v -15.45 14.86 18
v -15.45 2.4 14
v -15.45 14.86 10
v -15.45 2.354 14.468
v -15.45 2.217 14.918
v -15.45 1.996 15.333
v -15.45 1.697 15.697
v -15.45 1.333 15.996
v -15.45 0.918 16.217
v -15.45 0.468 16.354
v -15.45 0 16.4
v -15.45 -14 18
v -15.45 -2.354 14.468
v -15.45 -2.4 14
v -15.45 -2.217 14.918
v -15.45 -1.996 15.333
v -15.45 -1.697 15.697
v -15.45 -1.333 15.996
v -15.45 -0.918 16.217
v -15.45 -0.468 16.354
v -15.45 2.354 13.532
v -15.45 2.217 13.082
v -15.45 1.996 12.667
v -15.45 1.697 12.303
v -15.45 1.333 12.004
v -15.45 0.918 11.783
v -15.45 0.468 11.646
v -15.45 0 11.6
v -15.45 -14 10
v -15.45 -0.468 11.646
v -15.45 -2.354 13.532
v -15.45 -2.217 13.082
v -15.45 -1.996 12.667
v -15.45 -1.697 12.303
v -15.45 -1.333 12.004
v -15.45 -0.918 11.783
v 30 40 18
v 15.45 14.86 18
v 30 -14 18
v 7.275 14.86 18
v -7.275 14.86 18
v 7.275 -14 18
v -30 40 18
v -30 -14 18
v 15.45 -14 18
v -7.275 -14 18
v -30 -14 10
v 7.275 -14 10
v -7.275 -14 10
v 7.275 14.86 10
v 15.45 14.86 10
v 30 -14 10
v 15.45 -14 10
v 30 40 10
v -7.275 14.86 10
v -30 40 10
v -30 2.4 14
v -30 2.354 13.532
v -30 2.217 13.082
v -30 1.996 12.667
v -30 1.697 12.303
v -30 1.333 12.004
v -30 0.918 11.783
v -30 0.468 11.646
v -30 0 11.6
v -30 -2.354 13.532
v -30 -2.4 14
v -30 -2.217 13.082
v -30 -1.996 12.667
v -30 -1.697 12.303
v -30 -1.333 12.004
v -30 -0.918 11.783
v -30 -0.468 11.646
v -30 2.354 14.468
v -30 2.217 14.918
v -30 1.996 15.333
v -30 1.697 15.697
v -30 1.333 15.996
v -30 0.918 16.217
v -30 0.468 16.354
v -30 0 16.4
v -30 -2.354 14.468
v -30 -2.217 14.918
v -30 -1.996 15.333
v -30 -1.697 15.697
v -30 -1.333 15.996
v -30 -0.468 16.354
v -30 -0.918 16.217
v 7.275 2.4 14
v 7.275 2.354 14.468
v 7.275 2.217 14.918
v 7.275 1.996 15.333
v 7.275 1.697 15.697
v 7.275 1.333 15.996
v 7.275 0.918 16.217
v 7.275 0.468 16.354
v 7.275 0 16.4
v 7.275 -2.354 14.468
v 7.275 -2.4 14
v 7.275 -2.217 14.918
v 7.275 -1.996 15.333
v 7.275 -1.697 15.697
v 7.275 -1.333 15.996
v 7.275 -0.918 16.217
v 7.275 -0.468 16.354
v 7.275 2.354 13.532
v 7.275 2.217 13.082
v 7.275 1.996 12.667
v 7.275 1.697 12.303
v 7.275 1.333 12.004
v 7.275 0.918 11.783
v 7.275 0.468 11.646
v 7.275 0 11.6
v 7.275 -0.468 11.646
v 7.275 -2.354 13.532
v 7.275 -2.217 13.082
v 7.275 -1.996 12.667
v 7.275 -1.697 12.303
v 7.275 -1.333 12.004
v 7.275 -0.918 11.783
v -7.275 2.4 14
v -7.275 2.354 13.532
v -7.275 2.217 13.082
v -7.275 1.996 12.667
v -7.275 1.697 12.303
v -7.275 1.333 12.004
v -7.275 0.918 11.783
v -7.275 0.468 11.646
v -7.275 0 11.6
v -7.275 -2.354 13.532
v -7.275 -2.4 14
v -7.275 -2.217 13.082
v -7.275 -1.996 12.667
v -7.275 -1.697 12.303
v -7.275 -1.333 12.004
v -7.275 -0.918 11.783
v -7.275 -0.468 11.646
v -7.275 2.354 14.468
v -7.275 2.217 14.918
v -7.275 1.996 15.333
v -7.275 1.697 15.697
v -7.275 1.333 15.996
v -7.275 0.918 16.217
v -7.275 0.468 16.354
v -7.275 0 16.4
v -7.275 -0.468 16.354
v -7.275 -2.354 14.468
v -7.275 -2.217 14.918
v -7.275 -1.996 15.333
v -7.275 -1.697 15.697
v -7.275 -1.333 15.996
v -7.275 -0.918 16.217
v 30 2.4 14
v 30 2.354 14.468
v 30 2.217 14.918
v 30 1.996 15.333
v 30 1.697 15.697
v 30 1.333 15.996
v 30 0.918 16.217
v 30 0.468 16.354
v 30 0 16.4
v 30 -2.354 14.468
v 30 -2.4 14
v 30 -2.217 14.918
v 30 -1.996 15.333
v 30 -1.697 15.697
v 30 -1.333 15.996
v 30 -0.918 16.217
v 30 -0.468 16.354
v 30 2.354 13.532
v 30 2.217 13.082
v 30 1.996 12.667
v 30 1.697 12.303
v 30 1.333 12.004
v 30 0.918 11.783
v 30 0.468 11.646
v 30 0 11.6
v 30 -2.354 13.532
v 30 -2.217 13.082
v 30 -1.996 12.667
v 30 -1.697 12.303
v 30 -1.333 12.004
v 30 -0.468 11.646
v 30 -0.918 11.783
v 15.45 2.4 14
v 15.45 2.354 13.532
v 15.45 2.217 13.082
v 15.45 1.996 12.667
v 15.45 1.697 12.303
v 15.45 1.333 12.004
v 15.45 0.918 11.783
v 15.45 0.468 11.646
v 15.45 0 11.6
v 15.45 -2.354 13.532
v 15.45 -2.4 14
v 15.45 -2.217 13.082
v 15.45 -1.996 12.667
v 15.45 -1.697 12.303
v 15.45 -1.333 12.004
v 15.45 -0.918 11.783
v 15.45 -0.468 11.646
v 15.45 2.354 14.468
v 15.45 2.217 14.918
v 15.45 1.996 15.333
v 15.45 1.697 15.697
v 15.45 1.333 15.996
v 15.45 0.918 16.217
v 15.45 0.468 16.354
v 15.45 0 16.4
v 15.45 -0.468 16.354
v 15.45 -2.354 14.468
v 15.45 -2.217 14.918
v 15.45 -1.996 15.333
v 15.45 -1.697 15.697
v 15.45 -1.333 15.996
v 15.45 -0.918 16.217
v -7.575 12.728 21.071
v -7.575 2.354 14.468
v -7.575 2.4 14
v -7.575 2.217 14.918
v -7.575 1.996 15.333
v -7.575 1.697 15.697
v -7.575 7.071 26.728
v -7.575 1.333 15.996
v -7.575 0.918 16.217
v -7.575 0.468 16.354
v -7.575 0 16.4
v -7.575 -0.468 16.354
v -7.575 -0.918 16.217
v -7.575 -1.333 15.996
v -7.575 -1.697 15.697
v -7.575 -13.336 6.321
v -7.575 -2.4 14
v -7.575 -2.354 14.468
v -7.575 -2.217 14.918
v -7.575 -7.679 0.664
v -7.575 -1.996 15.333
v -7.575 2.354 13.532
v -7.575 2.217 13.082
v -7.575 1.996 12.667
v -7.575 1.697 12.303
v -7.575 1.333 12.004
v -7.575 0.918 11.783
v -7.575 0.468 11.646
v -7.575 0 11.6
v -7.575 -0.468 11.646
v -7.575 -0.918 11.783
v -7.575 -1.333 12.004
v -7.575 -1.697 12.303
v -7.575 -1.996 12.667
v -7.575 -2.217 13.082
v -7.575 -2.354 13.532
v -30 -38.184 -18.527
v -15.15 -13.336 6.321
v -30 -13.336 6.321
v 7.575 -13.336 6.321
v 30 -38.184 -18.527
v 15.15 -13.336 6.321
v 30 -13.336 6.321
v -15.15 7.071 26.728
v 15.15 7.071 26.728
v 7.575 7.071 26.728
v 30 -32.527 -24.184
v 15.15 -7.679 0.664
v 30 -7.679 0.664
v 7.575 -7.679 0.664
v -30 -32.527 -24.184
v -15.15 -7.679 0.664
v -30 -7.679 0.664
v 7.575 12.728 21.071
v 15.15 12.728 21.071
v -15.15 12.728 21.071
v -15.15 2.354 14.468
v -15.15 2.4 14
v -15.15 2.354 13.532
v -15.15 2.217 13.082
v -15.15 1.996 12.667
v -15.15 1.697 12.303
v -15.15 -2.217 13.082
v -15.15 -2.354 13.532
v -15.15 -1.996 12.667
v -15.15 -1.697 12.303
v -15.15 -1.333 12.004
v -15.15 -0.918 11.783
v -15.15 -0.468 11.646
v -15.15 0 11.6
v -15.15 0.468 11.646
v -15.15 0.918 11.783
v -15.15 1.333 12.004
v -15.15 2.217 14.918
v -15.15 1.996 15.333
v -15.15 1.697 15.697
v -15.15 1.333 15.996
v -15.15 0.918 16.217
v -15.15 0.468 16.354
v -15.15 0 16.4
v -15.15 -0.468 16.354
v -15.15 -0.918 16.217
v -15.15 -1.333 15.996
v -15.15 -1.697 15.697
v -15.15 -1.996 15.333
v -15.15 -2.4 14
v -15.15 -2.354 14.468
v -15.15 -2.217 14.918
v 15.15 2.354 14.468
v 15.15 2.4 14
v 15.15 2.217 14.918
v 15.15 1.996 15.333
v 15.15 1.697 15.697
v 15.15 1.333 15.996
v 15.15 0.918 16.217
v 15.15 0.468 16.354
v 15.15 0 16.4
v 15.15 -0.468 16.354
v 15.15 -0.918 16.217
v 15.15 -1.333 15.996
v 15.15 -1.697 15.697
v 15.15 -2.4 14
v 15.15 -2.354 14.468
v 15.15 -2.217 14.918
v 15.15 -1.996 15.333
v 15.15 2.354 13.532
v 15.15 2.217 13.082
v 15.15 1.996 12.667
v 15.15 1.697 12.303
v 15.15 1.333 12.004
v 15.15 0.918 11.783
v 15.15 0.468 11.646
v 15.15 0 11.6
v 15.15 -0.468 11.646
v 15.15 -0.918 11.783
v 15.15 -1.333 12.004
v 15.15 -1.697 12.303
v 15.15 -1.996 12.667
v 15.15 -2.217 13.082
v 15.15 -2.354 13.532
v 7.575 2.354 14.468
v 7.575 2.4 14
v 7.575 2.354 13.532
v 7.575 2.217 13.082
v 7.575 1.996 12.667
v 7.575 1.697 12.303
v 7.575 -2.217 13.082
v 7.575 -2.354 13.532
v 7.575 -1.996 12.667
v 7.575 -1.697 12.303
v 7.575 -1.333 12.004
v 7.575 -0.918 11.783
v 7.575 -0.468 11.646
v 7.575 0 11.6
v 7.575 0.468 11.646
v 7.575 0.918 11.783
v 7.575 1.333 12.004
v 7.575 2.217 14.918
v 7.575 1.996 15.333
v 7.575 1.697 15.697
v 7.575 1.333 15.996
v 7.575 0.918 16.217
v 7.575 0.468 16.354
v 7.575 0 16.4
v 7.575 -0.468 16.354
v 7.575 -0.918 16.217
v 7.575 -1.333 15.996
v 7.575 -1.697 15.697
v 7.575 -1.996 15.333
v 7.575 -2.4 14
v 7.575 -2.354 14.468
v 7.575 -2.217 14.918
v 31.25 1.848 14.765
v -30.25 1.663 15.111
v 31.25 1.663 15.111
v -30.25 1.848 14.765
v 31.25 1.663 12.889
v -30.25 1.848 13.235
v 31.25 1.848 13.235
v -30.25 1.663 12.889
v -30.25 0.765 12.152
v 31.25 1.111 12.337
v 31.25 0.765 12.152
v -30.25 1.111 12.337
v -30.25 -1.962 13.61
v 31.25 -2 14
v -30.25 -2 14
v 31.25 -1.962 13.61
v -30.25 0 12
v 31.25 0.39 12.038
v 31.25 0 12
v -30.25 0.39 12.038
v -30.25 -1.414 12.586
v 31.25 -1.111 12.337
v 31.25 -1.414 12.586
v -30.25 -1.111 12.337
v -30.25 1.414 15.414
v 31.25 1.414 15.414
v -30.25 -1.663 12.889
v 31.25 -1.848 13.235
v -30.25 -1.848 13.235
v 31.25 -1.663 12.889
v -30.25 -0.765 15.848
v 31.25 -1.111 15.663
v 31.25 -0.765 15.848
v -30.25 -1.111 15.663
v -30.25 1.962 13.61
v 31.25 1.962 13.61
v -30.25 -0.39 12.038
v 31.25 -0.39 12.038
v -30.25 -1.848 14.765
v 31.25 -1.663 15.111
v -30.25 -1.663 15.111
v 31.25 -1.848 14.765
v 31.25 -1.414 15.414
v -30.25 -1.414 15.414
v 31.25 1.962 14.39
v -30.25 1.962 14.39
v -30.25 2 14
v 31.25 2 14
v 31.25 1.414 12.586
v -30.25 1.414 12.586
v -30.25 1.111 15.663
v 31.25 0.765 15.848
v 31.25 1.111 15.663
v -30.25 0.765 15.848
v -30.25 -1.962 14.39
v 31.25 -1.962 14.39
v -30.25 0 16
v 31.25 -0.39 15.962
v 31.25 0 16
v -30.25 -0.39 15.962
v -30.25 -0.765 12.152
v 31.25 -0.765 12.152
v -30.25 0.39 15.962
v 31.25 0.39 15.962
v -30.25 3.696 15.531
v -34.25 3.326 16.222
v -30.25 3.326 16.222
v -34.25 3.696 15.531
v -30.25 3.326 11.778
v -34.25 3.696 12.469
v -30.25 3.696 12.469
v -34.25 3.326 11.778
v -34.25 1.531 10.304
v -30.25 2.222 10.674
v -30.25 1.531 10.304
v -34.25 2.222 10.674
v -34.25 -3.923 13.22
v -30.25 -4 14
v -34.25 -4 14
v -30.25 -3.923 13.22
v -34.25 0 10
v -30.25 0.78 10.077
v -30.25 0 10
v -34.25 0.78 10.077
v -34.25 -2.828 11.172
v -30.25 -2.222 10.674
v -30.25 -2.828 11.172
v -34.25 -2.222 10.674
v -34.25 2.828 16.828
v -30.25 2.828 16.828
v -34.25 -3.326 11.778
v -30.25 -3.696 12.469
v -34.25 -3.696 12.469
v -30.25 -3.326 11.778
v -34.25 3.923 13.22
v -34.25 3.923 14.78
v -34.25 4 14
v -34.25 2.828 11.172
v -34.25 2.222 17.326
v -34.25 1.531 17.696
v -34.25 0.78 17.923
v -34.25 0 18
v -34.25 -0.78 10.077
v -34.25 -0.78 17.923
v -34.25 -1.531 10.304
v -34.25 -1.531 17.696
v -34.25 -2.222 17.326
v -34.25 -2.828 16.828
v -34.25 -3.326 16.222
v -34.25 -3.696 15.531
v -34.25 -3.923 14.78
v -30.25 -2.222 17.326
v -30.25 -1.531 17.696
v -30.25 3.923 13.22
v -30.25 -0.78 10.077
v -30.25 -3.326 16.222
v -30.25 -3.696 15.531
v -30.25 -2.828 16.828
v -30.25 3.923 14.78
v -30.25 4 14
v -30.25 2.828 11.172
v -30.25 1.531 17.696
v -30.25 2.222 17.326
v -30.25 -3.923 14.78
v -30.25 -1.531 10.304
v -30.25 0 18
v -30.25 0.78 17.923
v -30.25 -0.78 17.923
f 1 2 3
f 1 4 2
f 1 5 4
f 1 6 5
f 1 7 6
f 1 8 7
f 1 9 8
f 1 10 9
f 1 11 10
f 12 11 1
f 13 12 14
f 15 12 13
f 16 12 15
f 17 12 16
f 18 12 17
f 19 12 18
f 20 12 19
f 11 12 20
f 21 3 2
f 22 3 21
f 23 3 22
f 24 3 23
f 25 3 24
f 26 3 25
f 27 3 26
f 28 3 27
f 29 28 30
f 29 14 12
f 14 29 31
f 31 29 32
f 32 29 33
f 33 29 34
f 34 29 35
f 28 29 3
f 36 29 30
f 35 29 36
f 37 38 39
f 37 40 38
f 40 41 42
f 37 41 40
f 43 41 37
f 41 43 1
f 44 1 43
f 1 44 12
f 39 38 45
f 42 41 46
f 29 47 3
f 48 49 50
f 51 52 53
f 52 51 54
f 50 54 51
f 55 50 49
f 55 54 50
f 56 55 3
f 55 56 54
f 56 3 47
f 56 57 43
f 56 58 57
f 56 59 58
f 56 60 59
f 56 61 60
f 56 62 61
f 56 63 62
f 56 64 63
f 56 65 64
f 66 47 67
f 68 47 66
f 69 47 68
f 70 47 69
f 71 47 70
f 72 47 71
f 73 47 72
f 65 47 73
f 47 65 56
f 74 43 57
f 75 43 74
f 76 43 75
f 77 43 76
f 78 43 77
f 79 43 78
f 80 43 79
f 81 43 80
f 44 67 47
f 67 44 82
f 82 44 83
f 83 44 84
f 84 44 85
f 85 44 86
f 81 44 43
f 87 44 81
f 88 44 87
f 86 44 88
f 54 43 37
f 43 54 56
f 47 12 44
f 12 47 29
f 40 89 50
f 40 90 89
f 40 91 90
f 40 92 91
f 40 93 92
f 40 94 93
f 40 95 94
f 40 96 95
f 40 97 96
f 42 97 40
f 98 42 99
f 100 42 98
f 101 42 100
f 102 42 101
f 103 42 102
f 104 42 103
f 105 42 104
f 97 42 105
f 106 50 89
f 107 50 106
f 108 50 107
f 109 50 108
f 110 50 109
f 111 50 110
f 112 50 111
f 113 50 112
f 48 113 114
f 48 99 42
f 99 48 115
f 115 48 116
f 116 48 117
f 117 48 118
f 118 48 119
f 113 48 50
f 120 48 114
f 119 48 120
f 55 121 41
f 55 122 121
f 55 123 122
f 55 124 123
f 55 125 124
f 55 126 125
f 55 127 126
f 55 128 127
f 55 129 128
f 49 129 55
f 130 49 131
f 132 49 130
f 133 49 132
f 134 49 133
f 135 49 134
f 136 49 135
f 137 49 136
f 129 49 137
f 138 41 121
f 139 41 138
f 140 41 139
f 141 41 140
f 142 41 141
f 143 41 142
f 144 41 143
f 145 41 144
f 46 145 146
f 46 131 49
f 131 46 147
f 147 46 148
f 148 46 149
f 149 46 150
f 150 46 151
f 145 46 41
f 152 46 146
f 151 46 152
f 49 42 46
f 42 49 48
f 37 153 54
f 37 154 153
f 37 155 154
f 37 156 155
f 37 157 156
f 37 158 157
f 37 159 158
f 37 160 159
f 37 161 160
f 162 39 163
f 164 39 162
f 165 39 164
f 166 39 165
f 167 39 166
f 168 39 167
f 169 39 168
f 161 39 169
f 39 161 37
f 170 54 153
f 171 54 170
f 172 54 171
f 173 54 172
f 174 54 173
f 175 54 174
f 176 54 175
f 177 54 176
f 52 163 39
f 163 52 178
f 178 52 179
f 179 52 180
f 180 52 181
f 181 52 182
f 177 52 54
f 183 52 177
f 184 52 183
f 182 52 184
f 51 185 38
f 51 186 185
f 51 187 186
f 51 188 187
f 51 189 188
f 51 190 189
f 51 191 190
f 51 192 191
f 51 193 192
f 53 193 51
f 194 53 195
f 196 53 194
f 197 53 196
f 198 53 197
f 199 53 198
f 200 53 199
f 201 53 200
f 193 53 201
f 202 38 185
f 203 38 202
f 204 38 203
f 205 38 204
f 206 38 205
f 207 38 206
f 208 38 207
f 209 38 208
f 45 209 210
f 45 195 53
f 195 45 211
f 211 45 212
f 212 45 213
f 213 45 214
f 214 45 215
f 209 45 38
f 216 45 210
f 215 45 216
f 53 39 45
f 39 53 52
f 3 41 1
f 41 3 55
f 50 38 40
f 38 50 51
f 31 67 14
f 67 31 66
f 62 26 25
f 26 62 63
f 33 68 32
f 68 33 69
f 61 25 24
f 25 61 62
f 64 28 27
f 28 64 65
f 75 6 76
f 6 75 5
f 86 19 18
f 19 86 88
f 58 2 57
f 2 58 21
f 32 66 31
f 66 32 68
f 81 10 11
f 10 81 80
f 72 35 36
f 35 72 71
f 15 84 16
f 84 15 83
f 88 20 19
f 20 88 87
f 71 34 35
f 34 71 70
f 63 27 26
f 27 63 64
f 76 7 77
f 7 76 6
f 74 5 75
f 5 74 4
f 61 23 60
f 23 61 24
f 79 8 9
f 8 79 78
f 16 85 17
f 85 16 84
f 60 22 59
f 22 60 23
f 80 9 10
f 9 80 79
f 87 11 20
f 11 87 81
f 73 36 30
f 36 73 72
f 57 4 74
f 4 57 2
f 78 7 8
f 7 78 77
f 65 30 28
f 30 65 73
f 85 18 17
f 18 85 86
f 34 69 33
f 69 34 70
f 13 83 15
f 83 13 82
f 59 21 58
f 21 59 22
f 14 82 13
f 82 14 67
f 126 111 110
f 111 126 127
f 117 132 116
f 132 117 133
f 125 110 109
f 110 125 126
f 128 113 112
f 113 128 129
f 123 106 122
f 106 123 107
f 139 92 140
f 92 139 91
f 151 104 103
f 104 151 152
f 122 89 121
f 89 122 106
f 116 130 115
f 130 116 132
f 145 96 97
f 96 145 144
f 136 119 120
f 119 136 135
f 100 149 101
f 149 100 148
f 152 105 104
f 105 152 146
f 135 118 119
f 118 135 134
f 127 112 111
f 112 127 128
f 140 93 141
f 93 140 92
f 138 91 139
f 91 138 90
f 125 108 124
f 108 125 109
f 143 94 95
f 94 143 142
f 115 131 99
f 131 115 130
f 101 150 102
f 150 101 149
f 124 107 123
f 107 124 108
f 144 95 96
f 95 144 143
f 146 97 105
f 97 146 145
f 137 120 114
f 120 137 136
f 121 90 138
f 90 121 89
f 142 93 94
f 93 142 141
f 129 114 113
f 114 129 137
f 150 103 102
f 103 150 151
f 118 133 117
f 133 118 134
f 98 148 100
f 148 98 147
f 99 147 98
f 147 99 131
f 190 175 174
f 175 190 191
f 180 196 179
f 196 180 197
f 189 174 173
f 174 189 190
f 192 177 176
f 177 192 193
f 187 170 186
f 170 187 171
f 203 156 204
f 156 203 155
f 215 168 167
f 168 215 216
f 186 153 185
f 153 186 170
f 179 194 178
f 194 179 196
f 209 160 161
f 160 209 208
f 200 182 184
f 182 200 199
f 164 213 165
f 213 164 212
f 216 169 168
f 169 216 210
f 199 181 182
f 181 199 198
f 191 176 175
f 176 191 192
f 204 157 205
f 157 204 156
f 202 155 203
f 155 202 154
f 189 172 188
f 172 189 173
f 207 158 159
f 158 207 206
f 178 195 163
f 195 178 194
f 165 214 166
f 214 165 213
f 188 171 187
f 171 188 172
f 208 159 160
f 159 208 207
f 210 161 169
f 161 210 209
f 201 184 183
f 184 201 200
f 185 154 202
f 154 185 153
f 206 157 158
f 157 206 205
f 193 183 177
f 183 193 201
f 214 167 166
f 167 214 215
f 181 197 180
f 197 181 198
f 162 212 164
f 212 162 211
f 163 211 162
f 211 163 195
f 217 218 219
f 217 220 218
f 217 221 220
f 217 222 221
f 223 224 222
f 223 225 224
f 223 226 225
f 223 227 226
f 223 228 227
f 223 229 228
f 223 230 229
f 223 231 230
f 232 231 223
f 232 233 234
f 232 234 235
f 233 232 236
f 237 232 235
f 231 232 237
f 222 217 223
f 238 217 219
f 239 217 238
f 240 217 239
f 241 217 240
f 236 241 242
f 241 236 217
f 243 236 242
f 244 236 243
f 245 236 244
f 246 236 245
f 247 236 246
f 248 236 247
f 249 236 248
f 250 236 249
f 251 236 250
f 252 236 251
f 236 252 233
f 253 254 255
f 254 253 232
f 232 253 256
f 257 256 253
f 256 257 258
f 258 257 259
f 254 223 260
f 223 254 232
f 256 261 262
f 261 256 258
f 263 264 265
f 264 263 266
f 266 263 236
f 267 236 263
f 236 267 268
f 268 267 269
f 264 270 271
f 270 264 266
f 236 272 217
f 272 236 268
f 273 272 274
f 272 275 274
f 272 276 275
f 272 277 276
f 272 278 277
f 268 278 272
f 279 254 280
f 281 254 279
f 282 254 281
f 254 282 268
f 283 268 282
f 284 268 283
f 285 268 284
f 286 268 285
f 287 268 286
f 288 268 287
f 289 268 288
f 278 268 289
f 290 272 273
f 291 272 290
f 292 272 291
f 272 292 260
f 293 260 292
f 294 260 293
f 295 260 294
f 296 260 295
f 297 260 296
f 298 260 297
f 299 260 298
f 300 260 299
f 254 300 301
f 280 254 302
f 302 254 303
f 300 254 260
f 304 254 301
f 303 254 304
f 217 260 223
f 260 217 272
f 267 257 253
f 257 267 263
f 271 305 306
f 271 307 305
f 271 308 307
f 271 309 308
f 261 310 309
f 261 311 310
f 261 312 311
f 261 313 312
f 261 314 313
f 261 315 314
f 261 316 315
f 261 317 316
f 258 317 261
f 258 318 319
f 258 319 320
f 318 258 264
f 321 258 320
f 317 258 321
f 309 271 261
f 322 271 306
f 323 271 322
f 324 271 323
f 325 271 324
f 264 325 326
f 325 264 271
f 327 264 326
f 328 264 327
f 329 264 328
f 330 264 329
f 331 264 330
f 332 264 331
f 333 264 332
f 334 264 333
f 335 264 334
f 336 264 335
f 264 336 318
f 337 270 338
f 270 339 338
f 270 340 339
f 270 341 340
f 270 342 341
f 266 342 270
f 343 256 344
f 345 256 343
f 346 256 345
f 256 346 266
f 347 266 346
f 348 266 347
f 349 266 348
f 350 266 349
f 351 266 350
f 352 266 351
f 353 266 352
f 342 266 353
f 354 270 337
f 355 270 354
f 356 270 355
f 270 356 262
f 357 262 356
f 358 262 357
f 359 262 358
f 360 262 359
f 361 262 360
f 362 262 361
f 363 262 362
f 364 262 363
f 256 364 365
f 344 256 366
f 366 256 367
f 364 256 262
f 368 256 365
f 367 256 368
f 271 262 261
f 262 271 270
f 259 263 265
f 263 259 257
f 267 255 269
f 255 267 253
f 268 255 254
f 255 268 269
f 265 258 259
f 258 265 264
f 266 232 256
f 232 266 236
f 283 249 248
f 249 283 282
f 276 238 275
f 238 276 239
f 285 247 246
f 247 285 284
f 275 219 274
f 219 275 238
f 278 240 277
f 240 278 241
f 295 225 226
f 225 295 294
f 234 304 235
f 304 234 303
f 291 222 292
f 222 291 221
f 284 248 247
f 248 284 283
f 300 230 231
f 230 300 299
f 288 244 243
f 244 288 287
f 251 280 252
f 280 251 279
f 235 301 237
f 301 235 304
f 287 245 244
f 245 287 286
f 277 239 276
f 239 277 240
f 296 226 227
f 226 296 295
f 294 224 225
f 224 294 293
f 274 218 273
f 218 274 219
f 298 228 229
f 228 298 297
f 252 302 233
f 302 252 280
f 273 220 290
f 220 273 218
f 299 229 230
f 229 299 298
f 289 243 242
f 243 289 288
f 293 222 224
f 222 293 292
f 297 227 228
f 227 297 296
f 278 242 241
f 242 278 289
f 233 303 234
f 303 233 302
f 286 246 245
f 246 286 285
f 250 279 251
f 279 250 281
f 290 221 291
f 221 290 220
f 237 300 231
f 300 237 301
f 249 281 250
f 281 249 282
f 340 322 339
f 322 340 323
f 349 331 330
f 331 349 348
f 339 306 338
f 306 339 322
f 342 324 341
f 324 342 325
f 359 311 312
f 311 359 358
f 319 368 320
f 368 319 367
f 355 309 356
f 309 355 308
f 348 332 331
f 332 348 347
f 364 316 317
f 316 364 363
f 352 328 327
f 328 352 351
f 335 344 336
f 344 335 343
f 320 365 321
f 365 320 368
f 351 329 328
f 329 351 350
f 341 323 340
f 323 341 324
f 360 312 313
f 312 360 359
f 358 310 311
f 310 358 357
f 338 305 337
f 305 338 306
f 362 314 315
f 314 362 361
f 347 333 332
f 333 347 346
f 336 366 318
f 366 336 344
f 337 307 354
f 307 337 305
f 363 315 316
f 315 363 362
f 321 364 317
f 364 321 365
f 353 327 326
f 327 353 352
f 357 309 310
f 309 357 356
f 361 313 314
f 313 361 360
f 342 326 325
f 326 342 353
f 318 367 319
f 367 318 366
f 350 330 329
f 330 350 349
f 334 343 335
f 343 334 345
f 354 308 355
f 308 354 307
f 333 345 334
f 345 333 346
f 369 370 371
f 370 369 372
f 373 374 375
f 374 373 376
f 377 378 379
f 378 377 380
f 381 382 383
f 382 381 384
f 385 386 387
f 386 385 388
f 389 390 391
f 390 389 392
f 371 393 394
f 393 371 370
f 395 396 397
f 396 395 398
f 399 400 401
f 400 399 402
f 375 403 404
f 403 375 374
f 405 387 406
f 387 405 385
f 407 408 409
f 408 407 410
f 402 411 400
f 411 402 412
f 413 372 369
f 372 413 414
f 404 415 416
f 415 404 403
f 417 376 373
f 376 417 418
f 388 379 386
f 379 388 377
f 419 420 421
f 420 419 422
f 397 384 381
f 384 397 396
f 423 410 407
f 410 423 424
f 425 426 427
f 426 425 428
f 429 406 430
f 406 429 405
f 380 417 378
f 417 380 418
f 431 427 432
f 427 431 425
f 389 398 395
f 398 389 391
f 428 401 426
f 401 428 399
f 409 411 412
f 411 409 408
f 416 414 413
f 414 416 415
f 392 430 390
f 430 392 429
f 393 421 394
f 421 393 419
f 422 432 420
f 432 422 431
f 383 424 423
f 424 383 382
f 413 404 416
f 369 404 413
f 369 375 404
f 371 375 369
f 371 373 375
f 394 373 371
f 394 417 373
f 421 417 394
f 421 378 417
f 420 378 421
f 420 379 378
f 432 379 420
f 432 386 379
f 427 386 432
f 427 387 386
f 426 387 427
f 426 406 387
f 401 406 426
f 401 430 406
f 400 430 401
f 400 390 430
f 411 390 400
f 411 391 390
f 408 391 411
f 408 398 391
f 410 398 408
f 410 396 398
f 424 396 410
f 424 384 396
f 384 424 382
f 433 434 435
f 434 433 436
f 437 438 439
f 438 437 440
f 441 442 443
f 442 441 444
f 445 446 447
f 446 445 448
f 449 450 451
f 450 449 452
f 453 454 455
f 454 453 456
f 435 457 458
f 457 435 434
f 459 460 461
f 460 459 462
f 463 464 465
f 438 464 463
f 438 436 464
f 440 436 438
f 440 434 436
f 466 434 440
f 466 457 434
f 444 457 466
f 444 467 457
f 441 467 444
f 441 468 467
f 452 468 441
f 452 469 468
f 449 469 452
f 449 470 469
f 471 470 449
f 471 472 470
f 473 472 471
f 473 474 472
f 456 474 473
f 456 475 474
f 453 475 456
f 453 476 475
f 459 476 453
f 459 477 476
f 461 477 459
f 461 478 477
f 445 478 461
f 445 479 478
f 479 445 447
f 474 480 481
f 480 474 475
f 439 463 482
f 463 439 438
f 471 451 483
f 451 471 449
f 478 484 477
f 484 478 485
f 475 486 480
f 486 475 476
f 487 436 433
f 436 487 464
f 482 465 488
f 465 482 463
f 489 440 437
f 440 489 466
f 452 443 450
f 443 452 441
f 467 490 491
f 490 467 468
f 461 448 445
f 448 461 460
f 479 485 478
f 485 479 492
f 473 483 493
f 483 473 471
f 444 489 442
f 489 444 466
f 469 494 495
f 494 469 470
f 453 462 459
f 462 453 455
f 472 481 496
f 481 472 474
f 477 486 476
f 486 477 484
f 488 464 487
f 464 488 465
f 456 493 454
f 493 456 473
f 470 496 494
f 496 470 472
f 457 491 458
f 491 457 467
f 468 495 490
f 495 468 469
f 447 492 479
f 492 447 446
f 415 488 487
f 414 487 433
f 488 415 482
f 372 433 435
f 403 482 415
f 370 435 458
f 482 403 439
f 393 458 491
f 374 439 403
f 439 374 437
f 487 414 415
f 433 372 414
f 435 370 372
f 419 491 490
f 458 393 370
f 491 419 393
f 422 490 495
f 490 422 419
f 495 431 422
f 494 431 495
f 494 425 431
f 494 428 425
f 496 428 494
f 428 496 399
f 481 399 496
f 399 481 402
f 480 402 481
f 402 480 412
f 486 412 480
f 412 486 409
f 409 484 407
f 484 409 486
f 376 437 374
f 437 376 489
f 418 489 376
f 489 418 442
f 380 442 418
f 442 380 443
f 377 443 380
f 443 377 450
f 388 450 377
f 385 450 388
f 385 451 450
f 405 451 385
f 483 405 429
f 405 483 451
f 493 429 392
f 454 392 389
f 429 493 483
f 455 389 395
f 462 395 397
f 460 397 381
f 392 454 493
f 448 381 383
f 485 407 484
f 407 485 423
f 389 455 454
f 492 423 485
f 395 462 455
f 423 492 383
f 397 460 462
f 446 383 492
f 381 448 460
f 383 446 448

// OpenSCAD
$fn = 32;

// ------------------------------------------------------------------------
// Butt hinge: hinge 60 mm, leaf swung 45 deg
// Every part is its own module, assembly() places every instance.
// ------------------------------------------------------------------------

// --- part 1 ---
module hinge_base() {
  difference() {
    union() {
      translate([-30, -14, -4]) cube([14.55, 54, 8]);
      translate([-7.275, -14, -4]) cube([14.55, 54, 8]);
      translate([15.45, -14, -4]) cube([14.55, 54, 8]);
      translate([-30, 14.86, -4]) cube([60, 25.14, 8]);
    }
    translate([-22.725, 0, 0]) rotate([0, 90, 0]) cylinder(h = 16.55, d = 4.8, center = true);
    translate([0, 0, 0]) rotate([0, 90, 0]) cylinder(h = 16.55, d = 4.8, center = true);
    translate([22.725, 0, 0]) rotate([0, 90, 0]) cylinder(h = 16.55, d = 4.8, center = true);
  }
}

// --- part 2 ---
module hinge_mover() {
  difference() {
    union() {
      translate([-15.15, -50, -4]) cube([7.575, 64, 8]);
      translate([7.575, -50, -4]) cube([7.575, 64, 8]);
      translate([-30, -50, -4]) cube([60, 35.14, 8]);
    }
    translate([-11.362, 0, 0]) rotate([0, 90, 0]) cylinder(h = 9.575, d = 4.8, center = true);
    translate([11.362, 0, 0]) rotate([0, 90, 0]) cylinder(h = 9.575, d = 4.8, center = true);
  }
}

// --- part 3 ---
module hinge_pin() {
  rotate([0, 90, 0]) cylinder(h = 62.5, d = 4, center = true);
  translate([-34.25, 0, 0]) rotate([0, 90, 0]) cylinder(h = 4, d = 8);
}

// --- assembly ---
module assembly() {
  color([0.80, 0.24, 0.20]) translate([0, 0, 14]) rotate([0, 0, 0]) hinge_base();
  color([0.20, 0.45, 0.75]) translate([0, 0, 14]) rotate([45, 0, 0]) hinge_mover();
  color([0.25, 0.62, 0.32]) translate([0, 0, 14]) rotate([0, 0, 0]) hinge_pin();
}

assembly();
